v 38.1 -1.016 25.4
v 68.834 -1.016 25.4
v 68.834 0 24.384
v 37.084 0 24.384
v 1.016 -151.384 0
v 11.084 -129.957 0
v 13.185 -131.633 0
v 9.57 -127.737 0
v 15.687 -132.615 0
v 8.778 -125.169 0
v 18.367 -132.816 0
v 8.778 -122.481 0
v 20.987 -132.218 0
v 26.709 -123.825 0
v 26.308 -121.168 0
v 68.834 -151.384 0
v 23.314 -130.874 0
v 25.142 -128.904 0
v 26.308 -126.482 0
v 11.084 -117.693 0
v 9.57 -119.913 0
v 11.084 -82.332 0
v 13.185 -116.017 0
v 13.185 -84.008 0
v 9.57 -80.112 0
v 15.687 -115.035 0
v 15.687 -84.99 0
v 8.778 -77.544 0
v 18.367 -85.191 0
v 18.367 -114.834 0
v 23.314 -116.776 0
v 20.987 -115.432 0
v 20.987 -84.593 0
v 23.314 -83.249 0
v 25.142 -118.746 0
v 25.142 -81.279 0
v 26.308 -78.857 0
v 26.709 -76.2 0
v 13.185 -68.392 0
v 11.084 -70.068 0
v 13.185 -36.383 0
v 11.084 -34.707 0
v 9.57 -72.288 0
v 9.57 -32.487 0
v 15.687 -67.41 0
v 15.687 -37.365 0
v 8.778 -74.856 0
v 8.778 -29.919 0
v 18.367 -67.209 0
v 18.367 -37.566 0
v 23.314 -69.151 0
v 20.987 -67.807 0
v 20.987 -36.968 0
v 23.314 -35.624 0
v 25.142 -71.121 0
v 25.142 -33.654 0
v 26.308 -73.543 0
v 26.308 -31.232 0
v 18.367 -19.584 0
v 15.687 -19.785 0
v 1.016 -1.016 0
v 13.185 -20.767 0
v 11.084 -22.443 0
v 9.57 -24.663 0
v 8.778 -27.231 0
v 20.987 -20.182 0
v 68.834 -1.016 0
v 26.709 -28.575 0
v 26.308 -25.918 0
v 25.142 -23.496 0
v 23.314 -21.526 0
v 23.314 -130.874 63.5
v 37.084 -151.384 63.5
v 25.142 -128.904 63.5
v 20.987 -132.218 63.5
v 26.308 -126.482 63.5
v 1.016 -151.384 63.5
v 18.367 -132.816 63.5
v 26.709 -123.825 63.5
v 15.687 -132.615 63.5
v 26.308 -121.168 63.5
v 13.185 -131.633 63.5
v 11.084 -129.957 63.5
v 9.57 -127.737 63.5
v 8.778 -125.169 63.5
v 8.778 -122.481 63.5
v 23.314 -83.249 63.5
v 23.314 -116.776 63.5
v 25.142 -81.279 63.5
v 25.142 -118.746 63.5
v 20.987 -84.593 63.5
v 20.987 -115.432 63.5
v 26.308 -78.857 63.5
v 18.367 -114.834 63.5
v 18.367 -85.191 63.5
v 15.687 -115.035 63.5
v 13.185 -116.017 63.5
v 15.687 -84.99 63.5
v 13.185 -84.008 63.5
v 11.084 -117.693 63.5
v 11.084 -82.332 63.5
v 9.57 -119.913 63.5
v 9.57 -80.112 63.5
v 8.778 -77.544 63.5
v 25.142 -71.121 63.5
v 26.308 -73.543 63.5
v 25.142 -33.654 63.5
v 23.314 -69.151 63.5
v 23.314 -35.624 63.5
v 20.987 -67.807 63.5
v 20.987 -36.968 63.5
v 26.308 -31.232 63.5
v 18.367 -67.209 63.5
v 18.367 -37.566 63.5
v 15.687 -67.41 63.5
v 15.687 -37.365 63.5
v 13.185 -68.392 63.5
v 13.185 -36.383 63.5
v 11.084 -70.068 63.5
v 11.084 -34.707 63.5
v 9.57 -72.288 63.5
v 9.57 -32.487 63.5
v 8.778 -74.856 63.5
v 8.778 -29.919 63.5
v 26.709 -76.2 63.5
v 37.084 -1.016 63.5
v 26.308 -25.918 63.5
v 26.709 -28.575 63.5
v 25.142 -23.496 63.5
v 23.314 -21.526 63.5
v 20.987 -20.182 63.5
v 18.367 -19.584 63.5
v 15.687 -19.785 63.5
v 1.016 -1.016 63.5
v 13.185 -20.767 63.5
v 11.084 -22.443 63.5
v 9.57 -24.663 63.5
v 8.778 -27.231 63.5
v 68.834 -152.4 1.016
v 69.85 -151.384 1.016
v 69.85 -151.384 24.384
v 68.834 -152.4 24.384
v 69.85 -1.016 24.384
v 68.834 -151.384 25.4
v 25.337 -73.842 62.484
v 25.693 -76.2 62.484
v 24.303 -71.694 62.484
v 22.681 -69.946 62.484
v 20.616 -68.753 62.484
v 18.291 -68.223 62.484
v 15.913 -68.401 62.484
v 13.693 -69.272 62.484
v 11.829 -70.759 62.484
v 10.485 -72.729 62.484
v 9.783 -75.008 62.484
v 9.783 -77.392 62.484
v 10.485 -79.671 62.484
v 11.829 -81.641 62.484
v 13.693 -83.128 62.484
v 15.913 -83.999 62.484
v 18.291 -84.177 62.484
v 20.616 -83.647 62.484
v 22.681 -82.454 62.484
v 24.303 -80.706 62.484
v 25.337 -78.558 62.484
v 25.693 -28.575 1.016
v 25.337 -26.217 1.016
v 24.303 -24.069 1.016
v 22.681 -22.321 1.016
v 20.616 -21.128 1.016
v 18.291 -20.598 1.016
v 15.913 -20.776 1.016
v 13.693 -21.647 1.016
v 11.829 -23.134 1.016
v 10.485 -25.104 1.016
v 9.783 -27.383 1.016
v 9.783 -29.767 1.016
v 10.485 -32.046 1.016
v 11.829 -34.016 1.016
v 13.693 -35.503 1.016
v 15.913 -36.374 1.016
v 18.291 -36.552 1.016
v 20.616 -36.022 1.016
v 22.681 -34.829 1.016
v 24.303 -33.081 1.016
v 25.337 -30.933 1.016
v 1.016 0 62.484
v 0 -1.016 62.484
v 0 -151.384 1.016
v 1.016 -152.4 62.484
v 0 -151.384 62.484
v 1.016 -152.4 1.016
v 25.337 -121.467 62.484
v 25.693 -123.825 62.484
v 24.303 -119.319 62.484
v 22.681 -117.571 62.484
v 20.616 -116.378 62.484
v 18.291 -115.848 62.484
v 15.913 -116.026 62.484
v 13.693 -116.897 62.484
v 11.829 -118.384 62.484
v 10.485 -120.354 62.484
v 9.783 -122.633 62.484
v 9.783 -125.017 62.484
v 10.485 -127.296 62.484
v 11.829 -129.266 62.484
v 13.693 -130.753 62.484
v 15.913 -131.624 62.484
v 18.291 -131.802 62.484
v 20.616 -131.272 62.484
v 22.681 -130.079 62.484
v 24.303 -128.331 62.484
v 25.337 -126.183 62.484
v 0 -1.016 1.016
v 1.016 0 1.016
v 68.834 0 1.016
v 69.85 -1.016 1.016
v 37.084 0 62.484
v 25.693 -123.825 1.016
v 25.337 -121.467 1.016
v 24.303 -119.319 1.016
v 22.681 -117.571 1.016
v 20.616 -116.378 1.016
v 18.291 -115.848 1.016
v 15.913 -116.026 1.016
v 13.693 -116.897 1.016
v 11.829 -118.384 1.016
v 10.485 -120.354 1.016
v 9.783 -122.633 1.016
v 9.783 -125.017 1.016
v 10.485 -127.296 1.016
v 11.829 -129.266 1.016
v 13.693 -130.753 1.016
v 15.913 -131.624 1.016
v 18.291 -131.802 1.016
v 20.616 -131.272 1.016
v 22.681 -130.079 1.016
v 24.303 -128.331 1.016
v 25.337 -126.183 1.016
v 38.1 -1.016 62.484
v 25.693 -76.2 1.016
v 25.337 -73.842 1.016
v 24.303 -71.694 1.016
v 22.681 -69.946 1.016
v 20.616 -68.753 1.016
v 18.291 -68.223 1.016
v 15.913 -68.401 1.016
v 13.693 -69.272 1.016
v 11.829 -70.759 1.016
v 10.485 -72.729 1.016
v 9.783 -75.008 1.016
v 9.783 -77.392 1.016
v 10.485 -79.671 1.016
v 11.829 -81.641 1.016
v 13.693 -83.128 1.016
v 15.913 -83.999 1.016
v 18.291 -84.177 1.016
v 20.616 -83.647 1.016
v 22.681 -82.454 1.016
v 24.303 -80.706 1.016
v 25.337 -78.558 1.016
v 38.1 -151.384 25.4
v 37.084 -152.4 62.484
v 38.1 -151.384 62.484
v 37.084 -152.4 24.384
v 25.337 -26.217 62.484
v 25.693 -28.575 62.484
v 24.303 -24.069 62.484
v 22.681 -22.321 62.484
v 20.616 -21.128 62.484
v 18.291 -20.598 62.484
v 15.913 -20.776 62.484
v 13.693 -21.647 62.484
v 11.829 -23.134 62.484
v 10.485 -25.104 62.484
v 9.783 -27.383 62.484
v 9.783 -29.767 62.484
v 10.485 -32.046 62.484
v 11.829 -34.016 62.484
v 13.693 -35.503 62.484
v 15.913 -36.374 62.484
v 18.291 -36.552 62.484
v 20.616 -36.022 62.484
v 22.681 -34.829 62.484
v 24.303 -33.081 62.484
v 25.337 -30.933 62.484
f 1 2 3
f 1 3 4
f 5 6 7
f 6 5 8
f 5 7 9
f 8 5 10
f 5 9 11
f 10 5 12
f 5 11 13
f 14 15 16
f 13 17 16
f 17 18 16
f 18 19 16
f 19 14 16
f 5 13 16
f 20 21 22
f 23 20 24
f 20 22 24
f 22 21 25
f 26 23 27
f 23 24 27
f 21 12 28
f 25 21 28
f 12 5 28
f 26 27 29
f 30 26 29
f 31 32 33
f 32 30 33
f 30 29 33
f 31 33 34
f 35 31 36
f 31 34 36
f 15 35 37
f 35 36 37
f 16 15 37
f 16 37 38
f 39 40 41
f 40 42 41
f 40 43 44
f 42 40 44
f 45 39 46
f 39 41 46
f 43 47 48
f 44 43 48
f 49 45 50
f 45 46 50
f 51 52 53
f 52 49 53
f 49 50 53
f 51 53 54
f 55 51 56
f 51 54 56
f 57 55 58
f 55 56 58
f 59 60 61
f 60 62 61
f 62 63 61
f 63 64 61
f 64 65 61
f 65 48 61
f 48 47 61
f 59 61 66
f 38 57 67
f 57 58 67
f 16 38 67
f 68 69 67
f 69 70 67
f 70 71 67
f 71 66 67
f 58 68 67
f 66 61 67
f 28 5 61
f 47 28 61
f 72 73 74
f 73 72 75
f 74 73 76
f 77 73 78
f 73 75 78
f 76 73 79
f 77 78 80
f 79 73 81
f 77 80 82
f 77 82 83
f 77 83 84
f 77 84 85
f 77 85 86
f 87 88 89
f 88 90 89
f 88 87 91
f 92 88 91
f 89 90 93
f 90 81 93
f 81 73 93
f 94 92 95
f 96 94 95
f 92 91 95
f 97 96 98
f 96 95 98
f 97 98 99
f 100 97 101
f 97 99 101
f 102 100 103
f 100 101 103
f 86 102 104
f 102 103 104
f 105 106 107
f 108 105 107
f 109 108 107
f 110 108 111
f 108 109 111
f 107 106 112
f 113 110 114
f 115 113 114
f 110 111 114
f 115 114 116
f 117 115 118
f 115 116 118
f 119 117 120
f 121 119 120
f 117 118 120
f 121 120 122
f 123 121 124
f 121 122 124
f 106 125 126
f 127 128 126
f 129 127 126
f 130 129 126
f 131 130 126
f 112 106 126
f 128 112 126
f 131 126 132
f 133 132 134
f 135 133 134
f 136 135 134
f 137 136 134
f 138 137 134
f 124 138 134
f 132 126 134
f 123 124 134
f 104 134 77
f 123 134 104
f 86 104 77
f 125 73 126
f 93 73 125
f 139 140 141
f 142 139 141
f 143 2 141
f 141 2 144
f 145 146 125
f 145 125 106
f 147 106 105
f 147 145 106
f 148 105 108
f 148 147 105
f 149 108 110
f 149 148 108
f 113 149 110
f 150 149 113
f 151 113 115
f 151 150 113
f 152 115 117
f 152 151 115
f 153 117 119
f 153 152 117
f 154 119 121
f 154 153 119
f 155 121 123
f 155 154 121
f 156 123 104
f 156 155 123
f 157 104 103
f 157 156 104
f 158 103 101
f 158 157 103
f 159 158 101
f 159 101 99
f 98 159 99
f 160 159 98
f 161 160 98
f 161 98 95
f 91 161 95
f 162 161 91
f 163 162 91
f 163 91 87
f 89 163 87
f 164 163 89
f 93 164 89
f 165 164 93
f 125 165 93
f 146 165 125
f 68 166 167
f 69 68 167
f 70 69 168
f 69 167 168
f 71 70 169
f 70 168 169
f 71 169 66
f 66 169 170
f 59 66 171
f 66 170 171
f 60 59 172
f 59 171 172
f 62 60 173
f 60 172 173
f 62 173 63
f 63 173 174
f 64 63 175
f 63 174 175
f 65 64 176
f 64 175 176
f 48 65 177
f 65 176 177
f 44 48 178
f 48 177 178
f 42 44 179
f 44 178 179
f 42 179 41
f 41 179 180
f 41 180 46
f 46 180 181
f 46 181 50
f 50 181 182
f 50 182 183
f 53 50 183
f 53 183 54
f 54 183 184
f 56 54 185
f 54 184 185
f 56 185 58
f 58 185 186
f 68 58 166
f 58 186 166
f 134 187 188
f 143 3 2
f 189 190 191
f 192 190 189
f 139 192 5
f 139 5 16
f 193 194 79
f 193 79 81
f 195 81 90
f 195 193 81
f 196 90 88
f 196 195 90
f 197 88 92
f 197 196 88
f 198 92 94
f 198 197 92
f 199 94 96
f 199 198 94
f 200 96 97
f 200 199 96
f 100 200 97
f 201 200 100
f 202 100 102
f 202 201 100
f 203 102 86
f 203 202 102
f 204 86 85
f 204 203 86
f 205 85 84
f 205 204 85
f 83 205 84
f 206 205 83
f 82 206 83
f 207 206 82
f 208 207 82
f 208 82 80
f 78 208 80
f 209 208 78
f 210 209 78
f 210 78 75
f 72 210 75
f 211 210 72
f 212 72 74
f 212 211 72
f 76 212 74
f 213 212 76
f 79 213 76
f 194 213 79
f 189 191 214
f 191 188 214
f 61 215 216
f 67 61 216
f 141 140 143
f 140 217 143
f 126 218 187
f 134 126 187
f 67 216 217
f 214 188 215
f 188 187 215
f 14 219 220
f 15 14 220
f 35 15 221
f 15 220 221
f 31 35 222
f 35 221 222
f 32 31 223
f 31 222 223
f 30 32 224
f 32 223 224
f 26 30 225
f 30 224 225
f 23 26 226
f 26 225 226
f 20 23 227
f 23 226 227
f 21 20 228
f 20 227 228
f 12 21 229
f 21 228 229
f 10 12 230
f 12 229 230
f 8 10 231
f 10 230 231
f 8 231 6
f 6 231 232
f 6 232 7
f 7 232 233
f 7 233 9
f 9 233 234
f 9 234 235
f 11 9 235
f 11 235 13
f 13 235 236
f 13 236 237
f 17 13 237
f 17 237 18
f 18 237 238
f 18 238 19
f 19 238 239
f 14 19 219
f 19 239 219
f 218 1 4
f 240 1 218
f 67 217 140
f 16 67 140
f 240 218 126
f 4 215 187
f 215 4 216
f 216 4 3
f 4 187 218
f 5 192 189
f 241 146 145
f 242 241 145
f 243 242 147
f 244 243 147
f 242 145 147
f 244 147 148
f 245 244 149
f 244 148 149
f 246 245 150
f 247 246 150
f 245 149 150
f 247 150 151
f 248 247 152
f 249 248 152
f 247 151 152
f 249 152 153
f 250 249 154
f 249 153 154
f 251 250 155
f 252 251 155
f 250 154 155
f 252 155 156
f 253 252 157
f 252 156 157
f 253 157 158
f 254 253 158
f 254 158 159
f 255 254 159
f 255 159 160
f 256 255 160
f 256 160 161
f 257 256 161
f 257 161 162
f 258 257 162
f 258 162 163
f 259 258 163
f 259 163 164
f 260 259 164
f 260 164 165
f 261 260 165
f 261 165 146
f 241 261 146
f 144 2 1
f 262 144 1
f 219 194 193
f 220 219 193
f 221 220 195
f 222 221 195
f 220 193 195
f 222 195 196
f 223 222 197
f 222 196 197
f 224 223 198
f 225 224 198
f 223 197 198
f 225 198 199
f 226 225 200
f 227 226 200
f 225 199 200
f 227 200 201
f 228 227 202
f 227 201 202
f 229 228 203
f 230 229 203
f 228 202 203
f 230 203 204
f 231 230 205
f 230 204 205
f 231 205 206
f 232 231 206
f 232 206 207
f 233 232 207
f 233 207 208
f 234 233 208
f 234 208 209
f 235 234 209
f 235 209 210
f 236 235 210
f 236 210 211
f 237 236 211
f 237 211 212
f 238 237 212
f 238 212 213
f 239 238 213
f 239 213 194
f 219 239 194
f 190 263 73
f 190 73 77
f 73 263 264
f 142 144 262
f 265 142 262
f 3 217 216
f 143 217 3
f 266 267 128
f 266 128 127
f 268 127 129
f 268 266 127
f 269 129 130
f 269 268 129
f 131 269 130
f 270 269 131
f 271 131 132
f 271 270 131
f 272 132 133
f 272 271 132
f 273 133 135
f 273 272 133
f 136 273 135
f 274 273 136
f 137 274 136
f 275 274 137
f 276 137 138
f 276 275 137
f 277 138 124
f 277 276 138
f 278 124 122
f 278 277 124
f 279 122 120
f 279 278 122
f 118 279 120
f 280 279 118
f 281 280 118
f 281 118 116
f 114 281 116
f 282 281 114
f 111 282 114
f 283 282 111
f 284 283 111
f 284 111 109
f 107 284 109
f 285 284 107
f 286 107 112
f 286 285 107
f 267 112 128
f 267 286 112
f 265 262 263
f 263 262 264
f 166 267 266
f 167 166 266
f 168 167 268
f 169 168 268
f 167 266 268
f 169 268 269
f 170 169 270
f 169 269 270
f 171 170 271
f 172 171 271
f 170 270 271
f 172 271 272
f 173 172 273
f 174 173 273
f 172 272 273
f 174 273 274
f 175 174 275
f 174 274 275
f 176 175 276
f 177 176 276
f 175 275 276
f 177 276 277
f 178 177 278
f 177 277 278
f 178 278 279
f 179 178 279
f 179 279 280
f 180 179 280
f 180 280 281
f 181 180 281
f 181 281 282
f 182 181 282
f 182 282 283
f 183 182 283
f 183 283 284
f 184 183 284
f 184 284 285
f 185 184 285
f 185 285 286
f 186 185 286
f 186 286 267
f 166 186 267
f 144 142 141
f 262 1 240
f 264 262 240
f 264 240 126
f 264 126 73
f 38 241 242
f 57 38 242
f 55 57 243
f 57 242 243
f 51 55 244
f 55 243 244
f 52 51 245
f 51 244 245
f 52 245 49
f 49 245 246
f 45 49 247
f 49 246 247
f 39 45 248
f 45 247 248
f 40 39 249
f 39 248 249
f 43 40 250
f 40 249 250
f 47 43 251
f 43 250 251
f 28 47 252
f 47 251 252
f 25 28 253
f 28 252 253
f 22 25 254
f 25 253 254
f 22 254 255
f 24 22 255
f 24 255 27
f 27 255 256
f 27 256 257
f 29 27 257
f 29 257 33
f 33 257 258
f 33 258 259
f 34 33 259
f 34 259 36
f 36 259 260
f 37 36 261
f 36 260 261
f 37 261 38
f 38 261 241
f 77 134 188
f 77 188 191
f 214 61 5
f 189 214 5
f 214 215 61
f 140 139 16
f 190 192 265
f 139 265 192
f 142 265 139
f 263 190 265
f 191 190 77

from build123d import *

# Parameters (mm, degrees)
F1_DEPTH = 152.4
F2_R     = 7.99973
F3_DEPTH = 63.501
F4_SIZE  = 1.016


with BuildPart() as f1:
    # F0 (on Front) → F1 (new body)
    with BuildSketch(Plane.XZ):
        Polygon((0, 63.5), (0, 0), (69.85, 0), (69.85, 25.4), (38.1, 25.4), (38.1, 63.5), align=None)
    extrude(amount=F1_DEPTH)

    # F2 (on face) → F3 (cut, through all)
    with BuildSketch(Plane.XY.offset(63.5)):
        with Locations((17.6930073649, -28.575)):
            Circle(F2_R)
        with Locations((17.6930073649, -76.2)):
            Circle(F2_R)
        with Locations((17.6930073649, -123.825)):
            Circle(F2_R)
    extrude(amount=-F3_DEPTH, mode=Mode.SUBTRACT)

    # F4
    f4_edges = [f1.edges().sort_by_distance(p)[0] for p in [
        (0, -152.4, 31.75),
        (34.925, -152.4, 0),
        (69.85, -152.4, 12.7),
        (53.975, -152.4, 25.4),
        (38.1, -152.4, 44.45),
        (19.05, -152.4, 63.5),
        (0, 0, 31.75),
        (34.925, 0, 0),
        (69.85, 0, 12.7),
        (53.975, 0, 25.4),
        (38.1, 0, 44.45),
        (19.05, 0, 63.5),
        (38.1, -76.2, 63.5),
        (0, -76.2, 63.5),
        (9.693277, -123.825, 63.5),
        (9.693277, -76.2, 63.5),
        (9.693277, -28.575, 63.5),
        (69.85, -76.2, 0),
        (69.85, -76.2, 25.4),
        (0, -76.2, 0),
        (9.693277, -123.825, 0),
        (9.693277, -76.2, 0),
        (9.693277, -28.575, 0),
    ]]
    chamfer(f4_edges, length=F4_SIZE)


solid = f1.part
